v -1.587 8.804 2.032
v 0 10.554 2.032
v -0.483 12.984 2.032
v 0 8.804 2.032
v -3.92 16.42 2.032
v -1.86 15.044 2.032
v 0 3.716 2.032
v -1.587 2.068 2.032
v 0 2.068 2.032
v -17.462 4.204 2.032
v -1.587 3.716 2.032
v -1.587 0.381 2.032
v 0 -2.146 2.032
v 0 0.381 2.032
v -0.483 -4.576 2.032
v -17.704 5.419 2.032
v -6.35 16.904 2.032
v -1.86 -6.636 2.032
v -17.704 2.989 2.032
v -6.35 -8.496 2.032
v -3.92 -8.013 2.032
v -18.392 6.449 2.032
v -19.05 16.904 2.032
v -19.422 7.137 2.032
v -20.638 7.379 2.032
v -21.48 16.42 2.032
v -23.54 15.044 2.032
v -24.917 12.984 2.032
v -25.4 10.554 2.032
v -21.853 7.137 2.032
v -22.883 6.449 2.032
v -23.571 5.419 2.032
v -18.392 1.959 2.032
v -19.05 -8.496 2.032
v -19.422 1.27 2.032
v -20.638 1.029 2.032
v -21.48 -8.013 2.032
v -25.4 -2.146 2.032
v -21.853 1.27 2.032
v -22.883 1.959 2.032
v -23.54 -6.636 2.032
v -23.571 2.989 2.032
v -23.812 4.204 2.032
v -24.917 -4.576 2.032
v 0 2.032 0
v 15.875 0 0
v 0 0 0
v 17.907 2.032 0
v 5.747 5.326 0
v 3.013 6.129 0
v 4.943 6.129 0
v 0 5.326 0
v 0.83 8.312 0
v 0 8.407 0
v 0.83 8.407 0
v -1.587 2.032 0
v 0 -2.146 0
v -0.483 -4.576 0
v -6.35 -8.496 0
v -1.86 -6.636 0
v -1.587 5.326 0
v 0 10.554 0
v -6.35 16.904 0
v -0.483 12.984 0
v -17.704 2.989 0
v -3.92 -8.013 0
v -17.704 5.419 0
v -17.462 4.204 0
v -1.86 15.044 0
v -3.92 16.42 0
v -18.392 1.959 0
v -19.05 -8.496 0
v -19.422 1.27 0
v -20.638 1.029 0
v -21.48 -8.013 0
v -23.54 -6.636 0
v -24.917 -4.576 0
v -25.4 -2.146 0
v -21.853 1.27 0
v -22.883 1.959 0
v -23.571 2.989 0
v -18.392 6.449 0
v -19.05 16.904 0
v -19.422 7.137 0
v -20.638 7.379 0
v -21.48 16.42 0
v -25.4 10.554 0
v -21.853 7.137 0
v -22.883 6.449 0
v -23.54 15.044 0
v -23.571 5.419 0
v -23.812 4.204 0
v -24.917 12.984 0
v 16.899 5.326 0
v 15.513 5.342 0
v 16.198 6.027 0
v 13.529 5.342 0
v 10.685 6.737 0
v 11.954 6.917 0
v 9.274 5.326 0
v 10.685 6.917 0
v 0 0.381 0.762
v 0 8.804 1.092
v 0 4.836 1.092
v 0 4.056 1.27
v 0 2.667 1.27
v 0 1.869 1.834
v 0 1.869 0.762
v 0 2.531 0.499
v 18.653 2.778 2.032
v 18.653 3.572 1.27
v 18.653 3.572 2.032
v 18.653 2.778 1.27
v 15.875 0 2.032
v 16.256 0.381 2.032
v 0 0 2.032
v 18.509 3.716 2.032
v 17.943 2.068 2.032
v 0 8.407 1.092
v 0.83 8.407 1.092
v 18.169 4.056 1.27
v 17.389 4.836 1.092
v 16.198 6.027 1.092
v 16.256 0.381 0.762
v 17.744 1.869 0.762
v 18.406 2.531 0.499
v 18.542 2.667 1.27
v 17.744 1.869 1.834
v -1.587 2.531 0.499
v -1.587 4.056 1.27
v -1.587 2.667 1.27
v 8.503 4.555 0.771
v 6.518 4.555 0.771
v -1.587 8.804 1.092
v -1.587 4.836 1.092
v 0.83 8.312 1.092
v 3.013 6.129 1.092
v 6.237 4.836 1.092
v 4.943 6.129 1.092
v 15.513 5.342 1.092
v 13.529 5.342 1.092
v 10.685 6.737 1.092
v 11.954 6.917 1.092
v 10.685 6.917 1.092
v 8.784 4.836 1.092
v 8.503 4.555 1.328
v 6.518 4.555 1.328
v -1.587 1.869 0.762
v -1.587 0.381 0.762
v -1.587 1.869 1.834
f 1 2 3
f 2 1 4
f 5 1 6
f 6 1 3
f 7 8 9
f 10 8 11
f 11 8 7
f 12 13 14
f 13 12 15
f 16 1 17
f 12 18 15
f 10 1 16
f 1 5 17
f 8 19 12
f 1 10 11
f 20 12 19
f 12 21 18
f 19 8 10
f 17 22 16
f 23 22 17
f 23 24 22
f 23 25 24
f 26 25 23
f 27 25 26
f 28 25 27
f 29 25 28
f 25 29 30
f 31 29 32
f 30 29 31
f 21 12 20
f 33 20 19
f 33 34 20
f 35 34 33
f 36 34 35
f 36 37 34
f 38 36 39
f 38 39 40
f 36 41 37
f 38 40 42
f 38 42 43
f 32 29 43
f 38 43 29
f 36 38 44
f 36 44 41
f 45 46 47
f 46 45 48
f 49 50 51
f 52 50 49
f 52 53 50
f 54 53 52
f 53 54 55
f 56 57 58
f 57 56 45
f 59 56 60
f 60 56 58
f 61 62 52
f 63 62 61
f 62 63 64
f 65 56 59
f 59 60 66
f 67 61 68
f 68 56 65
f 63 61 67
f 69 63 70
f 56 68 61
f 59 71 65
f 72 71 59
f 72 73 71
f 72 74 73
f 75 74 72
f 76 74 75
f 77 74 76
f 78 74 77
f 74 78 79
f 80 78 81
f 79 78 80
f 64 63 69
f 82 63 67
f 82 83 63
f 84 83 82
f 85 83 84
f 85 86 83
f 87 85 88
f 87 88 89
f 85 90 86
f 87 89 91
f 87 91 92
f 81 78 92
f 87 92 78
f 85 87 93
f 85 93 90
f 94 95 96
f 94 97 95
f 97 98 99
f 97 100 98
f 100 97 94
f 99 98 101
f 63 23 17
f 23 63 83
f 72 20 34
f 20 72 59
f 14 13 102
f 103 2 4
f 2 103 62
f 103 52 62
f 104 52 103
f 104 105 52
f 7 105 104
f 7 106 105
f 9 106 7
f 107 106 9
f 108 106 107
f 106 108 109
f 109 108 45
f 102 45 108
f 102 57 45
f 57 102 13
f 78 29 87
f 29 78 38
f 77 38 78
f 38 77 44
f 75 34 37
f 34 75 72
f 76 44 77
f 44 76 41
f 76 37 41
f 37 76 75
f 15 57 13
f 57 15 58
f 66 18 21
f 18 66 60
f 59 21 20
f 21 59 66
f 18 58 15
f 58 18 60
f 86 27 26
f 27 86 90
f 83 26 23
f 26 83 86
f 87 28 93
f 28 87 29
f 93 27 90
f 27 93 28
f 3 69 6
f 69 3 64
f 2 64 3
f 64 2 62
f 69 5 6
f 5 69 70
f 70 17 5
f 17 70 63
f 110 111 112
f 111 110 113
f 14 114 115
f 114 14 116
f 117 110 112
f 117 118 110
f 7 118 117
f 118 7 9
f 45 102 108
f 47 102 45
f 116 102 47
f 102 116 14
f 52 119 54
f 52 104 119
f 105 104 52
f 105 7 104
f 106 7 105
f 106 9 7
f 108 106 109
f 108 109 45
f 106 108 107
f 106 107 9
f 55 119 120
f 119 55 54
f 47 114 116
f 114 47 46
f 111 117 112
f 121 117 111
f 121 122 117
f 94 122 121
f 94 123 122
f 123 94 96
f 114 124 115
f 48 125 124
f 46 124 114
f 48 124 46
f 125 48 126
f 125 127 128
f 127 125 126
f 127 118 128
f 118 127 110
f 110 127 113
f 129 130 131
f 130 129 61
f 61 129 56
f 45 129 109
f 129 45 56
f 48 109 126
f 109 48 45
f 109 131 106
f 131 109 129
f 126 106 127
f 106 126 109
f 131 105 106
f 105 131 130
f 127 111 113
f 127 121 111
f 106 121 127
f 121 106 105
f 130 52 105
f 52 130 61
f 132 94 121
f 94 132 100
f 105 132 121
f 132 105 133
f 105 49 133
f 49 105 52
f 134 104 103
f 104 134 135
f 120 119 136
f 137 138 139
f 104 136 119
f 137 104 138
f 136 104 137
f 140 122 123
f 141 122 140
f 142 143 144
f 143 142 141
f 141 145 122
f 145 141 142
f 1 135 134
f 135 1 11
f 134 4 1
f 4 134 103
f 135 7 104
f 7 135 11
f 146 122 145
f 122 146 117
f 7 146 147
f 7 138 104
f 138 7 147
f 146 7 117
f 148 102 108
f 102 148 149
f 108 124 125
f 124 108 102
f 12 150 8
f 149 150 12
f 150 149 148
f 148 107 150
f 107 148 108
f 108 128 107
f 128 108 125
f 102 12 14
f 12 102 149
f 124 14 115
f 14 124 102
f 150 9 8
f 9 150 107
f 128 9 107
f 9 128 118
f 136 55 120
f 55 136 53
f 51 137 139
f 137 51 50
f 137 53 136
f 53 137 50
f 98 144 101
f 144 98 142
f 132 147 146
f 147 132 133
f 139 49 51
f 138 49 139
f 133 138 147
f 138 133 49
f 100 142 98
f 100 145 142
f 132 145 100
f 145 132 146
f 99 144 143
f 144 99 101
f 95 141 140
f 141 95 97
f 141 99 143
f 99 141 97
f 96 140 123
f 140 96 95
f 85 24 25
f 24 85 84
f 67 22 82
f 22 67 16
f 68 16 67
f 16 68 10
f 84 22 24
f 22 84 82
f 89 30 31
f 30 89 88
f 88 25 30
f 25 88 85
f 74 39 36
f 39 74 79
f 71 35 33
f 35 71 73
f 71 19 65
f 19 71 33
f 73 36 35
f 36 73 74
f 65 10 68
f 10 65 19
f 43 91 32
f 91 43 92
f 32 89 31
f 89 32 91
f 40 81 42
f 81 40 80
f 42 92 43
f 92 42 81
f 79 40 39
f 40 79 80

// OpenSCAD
// Generated by KeyCopier for Rittal 3524 E
function mm(i) = i*25.4;

module rounded(size, r) { union() { translate([r, 0, 0]) cube([size[0]-2*r, size[1], size[2]]); translate([0, r, 0]) cube([size[0], size[1]-2*r, size[2]]); translate([r, r, 0]) cylinder(h=size[2], r=r, $fn=16); translate([size[0]-r, r, 0]) cylinder(h=size[2], r=r, $fn=16); translate([r, size[1]-r, 0]) cylinder(h=size[2], r=r, $fn=16); translate([size[0]-r, size[1]-r, 0]) cylinder(h=size[2], r=r, $fn=16); } }
module bit() { w = mm(1/4); difference() { translate([-w/2, 0, 0]) cube([w, mm(1), w]); translate([-mm(5/128), 0, 0]) rotate([0, 0, 135]) cube([w, w, w]); translate([mm(5/128), 0, 0]) rotate([0, 0, -45]) cube([w, w, w]); } }
module key(bits) {
    thickness = mm(0.080);
    length = mm(0.750);
    width = mm(0.331);
    shoulder = mm(0.138);
    pin_spacing = mm(0.138);
    depth_inc = mm(0.031);
    fudge = 0.5;
    h_l = mm(1); h_w = mm(1); h_d = mm(1/16);
    difference() {
        union() { translate([-h_l, -h_w/2 + width/2, 0]) rounded([h_l, h_w, thickness], mm(1/4)); cube([length - mm(1/64), width, thickness]); }
        translate([length, mm(1/8), 0]) { rotate([0, 0, 45]) cube([10, 10, thickness]); rotate([0, 0, 225]) cube([10, 10, thickness]); }
        translate([-h_l + mm(3/16), width/2, 0]) cylinder(h=thickness, r=mm(1/8), $fn=16);
        union() { translate([-h_d, mm(.105), mm(.025)]) rotate([225, 0, 0]) cube([length + h_d, width, width]); translate([-h_d, mm(.105), mm(.05)]) rotate([260, 0, 0]) cube([length + h_d, thickness/2, mm(1/32)]); translate([-h_d, mm(.105), 0]) cube([length + h_d, mm(7/128), mm(.05)]); translate([-h_d, mm(.105) + mm(7/128), mm(.05)]) rotate([225, 0, 0]) cube([length + h_d, mm(3/64), thickness]); }
        translate([-h_d, width - mm(9/64), mm(.043)]) { cube([length + h_d, width - (width - mm(10/64)), thickness]); rotate([50, 0, 0]) cube([length + h_d, width, thickness]); }
        union() { translate([-h_d, mm(0.015), mm(.03)]) cube([length + h_d, mm(15/256), thickness]); translate([-h_d, mm(0.015) + mm(13/256), thickness - mm(1/64)]) rotate([45, 0, 0]) cube([length + h_d, mm(1/16), mm(1/16)]); }
        for (b = [0:3]) {
            translate([shoulder + fudge + b*pin_spacing, width - mm(.008) - (bits[b] - 1)*depth_inc - fudge, 0]) bit();
        }
    }
}

key([3,5,2,4]);
